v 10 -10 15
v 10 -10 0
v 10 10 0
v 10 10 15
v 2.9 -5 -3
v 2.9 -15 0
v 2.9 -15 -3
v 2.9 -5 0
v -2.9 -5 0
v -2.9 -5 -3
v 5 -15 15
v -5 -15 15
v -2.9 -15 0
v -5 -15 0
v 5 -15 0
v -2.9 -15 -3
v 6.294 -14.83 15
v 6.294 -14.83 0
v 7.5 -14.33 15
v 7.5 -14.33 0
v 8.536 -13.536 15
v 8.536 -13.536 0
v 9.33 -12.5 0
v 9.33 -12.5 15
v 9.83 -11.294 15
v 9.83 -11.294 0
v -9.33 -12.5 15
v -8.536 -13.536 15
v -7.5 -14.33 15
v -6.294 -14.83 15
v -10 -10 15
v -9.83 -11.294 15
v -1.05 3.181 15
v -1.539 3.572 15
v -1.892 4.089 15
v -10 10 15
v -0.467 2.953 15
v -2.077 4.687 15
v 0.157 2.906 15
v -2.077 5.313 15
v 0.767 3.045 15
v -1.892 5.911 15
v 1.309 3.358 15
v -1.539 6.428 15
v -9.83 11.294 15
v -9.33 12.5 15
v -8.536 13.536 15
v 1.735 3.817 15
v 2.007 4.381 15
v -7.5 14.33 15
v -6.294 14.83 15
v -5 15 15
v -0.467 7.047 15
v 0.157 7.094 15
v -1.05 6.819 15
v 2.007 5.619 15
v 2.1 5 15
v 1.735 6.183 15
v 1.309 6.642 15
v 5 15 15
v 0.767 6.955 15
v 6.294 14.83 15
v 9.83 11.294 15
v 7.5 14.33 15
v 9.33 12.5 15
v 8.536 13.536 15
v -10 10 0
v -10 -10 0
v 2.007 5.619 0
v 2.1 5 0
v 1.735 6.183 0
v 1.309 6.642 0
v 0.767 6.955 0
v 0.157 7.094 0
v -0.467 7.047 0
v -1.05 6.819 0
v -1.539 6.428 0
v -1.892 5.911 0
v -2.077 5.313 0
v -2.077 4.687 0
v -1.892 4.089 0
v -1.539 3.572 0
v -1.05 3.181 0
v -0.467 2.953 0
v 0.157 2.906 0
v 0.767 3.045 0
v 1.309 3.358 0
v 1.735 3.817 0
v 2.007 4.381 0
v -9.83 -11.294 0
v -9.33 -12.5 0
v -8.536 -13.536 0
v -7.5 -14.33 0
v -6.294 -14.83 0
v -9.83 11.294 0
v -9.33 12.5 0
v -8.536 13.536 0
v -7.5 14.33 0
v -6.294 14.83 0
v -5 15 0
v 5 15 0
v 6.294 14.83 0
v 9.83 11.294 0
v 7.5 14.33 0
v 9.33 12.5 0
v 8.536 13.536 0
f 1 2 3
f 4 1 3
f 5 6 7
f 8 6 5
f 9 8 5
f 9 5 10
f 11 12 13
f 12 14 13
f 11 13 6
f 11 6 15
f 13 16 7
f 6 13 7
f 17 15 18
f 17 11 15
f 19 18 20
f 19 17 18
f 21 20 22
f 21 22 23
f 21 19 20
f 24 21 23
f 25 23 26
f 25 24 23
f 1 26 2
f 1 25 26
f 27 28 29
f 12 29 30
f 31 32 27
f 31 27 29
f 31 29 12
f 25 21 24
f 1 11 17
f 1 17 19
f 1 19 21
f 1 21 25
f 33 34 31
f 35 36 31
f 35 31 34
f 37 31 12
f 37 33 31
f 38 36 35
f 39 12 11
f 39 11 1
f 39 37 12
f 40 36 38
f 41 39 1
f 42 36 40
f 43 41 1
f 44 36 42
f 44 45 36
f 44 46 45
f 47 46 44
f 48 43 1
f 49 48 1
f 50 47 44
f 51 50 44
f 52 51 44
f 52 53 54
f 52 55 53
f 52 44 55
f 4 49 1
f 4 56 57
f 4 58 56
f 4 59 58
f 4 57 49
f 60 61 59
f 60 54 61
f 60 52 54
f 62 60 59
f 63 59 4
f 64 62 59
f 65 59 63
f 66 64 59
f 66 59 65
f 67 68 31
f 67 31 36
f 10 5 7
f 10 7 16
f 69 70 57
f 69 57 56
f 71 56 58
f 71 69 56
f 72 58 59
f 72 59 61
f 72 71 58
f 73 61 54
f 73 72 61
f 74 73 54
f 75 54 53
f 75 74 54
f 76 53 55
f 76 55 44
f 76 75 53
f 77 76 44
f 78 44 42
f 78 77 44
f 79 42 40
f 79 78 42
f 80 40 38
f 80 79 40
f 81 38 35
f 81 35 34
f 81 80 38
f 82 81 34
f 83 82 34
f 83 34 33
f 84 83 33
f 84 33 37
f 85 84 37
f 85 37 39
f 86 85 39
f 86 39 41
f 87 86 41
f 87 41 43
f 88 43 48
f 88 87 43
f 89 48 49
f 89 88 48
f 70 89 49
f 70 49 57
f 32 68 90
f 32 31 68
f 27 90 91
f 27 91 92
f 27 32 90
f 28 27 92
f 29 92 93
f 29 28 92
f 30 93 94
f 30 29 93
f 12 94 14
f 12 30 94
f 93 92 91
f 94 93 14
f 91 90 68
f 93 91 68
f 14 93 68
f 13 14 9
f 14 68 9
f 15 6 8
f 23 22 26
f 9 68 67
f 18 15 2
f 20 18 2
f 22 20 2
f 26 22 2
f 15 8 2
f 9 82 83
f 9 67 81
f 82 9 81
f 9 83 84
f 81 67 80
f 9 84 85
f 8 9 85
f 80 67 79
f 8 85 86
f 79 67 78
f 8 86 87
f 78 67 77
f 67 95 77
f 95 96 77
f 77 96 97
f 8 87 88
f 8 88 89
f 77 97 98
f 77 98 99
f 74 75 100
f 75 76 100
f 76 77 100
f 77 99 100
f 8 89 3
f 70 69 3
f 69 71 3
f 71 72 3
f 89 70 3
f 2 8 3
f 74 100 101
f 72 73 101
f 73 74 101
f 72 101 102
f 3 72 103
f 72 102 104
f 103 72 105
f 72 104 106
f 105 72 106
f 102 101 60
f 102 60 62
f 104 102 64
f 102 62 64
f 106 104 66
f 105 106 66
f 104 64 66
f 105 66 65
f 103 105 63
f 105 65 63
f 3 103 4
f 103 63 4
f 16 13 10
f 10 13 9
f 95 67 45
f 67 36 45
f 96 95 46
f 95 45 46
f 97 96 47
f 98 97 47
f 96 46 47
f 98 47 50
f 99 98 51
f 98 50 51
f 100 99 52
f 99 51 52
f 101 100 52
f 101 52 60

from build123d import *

# Parameters (mm, degrees)
SKETCH_2_W      = 20
SKETCH_2_H      = 30
SKETCH_2_R      = 2.1
EXTRUDE_1_DEPTH = 15
SKETCH_3_W      = 5.8
SKETCH_3_H      = 10
EXTRUDE_2_DEPTH = 3
FILLET_1_R      = 5


with BuildPart() as part:
    # ｽｹｯﾁ2 → ﾎﾞｽ - 押し出し1 (new body)
    with BuildSketch(Plane.XY):
        Rectangle(SKETCH_2_W, SKETCH_2_H)
        with Locations((0, 5)):
            Circle(SKETCH_2_R, mode=Mode.SUBTRACT)
    extrude(amount=EXTRUDE_1_DEPTH)

    # ｽｹｯﾁ3 → ﾎﾞｽ - 押し出し2 (add)
    with BuildSketch(Plane(origin=(0, 0, 0), x_dir=(-1, 0, 0), z_dir=(0, 0, -1))):
        with Locations((0, -10)):
            Rectangle(SKETCH_3_W, SKETCH_3_H)
    extrude(amount=EXTRUDE_2_DEPTH)

    # ﾌｨﾚｯﾄ1
    fillet_1_edges = [part.edges().sort_by_distance(p)[0] for p in [
        (10, -15, 7.5),
        (-10, -15, 7.5),
        (-10, 15, 7.5),
        (10, 15, 7.5),
    ]]
    fillet(fillet_1_edges, radius=FILLET_1_R)


solid = part.part
